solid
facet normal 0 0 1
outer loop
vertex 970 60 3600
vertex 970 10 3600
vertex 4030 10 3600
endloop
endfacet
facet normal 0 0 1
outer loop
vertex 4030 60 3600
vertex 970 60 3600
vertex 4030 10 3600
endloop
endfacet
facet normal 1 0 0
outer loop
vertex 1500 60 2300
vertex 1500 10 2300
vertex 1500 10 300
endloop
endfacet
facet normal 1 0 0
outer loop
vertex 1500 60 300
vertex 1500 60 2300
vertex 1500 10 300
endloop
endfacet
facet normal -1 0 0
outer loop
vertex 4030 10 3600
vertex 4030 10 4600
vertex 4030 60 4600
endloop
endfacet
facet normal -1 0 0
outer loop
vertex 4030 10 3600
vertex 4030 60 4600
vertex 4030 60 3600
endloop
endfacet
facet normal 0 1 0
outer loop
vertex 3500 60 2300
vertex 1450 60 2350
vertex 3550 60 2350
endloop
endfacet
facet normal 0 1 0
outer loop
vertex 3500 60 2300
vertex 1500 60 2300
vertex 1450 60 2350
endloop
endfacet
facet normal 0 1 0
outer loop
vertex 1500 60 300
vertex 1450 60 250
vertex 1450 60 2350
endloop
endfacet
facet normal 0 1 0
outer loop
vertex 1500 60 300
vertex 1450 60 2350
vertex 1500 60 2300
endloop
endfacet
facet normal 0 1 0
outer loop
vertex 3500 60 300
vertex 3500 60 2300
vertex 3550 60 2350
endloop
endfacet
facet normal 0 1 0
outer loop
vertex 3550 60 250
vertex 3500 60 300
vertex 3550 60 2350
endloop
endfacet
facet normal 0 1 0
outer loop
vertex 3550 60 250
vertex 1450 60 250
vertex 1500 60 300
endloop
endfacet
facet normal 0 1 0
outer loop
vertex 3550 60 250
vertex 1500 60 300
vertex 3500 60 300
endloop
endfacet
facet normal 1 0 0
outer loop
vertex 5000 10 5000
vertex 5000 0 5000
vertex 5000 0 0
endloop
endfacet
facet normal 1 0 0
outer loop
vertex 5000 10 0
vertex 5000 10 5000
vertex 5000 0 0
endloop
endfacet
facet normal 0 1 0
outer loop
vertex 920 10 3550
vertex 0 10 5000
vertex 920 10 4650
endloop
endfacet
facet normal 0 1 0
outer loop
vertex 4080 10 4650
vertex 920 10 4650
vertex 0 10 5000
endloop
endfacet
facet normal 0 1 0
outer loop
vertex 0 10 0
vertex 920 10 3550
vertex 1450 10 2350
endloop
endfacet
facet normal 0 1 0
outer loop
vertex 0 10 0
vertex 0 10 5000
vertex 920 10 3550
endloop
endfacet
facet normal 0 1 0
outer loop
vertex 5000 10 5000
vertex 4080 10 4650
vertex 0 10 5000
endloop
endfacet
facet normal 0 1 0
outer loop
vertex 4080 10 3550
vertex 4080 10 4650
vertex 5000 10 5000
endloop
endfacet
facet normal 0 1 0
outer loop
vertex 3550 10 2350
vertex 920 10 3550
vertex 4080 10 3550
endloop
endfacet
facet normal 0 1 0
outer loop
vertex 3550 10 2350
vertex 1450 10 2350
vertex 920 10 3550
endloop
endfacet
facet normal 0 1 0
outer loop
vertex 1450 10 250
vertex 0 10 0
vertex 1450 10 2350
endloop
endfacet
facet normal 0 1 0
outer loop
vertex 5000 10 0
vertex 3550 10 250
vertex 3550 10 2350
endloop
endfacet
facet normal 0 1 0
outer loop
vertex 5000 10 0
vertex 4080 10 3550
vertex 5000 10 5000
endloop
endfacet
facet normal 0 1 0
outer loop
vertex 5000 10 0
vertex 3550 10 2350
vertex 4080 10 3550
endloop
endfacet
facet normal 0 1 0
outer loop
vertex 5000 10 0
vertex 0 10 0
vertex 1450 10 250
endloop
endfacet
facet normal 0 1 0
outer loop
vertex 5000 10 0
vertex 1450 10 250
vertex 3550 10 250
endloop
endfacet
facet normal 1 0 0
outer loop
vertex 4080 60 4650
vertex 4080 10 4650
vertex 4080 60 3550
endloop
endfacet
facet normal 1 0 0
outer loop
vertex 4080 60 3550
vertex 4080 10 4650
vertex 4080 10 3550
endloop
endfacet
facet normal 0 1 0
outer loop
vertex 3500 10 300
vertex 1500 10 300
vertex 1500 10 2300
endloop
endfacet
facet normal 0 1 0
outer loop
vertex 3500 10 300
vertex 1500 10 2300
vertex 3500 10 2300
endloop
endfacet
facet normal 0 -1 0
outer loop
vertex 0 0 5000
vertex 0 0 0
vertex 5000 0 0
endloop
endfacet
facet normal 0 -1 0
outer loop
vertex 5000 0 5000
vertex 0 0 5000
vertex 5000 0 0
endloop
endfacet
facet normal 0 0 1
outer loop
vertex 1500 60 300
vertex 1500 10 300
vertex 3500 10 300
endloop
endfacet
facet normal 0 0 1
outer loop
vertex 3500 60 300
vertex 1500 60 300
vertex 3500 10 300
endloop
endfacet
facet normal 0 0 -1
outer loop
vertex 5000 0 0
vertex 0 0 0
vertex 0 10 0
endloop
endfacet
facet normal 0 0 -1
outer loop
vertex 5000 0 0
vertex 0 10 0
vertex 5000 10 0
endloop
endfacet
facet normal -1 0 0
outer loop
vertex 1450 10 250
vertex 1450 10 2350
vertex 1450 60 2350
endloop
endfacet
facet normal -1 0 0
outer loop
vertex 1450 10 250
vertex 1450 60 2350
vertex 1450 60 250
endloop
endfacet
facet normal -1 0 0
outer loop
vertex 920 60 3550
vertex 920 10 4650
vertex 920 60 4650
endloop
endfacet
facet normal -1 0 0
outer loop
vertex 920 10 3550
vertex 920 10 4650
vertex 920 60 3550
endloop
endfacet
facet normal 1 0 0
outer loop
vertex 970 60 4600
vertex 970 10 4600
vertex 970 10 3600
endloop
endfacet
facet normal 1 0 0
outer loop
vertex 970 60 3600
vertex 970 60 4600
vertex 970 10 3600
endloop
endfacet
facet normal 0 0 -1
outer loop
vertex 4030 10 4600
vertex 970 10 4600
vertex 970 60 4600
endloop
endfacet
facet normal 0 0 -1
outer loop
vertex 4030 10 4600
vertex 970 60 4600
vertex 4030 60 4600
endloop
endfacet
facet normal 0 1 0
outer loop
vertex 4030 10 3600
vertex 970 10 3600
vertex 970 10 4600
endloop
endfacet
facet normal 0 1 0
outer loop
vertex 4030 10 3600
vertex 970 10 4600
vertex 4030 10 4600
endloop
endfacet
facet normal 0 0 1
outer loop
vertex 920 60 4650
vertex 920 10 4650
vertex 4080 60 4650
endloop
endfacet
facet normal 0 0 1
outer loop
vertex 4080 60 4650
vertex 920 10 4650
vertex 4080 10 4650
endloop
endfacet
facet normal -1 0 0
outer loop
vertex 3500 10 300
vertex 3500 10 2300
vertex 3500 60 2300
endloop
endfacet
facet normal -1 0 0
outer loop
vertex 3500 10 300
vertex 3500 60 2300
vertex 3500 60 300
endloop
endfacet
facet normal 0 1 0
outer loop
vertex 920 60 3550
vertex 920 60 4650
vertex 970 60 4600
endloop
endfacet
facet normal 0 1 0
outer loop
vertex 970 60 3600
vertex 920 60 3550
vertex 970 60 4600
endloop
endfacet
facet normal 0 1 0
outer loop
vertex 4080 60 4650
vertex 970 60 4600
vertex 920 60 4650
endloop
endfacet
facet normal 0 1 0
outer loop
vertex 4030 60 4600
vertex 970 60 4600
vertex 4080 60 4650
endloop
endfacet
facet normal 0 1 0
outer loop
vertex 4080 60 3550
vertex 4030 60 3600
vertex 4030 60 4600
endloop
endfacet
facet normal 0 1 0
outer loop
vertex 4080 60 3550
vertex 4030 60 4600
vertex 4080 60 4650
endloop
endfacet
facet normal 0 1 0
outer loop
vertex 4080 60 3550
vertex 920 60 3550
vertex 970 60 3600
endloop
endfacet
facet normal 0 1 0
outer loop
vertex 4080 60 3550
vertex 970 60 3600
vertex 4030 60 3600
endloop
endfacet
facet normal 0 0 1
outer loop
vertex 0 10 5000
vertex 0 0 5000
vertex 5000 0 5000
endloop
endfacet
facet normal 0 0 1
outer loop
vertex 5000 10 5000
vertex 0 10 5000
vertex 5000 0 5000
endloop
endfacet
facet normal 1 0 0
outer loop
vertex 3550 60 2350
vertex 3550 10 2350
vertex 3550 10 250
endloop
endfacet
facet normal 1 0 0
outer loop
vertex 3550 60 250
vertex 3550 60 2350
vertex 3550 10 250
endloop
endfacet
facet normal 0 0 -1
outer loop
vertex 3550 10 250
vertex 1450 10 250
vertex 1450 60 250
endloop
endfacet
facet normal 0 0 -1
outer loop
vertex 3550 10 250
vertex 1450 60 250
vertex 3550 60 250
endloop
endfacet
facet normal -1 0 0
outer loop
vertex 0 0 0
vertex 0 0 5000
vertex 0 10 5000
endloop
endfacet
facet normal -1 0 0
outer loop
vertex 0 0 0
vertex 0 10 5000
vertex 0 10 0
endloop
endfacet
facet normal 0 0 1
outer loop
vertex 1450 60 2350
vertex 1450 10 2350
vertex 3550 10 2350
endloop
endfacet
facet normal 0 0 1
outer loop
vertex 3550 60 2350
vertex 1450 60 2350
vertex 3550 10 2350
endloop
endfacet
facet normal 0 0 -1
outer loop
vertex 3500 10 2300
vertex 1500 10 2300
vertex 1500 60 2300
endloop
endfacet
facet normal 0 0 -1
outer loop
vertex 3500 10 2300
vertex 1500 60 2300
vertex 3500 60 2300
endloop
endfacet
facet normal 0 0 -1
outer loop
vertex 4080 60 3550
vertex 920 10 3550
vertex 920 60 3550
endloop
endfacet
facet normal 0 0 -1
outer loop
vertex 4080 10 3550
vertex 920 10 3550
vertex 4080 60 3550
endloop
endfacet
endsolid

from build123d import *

# Parameters (mm, degrees)
SKETCH1_W           = 5000
SKETCH1_H           = 5000
BOSS_EXTRUDE1_DEPTH = 10
SKETCH2_W           = 2100
SKETCH2_H           = 2100
SKETCH2_W_2         = 2000
SKETCH2_H_2         = 2000
SKETCH2_W_3         = 3160
SKETCH2_H_3         = 1100
SKETCH2_W_4         = 3060
SKETCH2_H_4         = 1000
BOSS_EXTRUDE2_DEPTH = 50


with BuildPart() as part:
    # Sketch1 → Boss-Extrude1 (new body)
    with BuildSketch(Plane(origin=(0, 0, 0), x_dir=(1, 0, 0), z_dir=(0, 1, 0))):
        with Locations((2500, -2500)):
            Rectangle(SKETCH1_W, SKETCH1_H)
    extrude(amount=BOSS_EXTRUDE1_DEPTH)

    # Sketch2 → Boss-Extrude2 (add)
    with BuildSketch(Plane(origin=(0, 10, 0), x_dir=(1, 0, 0), z_dir=(0, 1, 0))):
        with Locations((2500, -1300)):
            Rectangle(SKETCH2_W, SKETCH2_H)
        with Locations((2500, -1300)):
            Rectangle(SKETCH2_W_2, SKETCH2_H_2, mode=Mode.SUBTRACT)
        with Locations((2500, -4100)):
            Rectangle(SKETCH2_W_3, SKETCH2_H_3)
        with Locations((2500, -4100)):
            Rectangle(SKETCH2_W_4, SKETCH2_H_4, mode=Mode.SUBTRACT)
    extrude(amount=BOSS_EXTRUDE2_DEPTH)


solid = part.part
